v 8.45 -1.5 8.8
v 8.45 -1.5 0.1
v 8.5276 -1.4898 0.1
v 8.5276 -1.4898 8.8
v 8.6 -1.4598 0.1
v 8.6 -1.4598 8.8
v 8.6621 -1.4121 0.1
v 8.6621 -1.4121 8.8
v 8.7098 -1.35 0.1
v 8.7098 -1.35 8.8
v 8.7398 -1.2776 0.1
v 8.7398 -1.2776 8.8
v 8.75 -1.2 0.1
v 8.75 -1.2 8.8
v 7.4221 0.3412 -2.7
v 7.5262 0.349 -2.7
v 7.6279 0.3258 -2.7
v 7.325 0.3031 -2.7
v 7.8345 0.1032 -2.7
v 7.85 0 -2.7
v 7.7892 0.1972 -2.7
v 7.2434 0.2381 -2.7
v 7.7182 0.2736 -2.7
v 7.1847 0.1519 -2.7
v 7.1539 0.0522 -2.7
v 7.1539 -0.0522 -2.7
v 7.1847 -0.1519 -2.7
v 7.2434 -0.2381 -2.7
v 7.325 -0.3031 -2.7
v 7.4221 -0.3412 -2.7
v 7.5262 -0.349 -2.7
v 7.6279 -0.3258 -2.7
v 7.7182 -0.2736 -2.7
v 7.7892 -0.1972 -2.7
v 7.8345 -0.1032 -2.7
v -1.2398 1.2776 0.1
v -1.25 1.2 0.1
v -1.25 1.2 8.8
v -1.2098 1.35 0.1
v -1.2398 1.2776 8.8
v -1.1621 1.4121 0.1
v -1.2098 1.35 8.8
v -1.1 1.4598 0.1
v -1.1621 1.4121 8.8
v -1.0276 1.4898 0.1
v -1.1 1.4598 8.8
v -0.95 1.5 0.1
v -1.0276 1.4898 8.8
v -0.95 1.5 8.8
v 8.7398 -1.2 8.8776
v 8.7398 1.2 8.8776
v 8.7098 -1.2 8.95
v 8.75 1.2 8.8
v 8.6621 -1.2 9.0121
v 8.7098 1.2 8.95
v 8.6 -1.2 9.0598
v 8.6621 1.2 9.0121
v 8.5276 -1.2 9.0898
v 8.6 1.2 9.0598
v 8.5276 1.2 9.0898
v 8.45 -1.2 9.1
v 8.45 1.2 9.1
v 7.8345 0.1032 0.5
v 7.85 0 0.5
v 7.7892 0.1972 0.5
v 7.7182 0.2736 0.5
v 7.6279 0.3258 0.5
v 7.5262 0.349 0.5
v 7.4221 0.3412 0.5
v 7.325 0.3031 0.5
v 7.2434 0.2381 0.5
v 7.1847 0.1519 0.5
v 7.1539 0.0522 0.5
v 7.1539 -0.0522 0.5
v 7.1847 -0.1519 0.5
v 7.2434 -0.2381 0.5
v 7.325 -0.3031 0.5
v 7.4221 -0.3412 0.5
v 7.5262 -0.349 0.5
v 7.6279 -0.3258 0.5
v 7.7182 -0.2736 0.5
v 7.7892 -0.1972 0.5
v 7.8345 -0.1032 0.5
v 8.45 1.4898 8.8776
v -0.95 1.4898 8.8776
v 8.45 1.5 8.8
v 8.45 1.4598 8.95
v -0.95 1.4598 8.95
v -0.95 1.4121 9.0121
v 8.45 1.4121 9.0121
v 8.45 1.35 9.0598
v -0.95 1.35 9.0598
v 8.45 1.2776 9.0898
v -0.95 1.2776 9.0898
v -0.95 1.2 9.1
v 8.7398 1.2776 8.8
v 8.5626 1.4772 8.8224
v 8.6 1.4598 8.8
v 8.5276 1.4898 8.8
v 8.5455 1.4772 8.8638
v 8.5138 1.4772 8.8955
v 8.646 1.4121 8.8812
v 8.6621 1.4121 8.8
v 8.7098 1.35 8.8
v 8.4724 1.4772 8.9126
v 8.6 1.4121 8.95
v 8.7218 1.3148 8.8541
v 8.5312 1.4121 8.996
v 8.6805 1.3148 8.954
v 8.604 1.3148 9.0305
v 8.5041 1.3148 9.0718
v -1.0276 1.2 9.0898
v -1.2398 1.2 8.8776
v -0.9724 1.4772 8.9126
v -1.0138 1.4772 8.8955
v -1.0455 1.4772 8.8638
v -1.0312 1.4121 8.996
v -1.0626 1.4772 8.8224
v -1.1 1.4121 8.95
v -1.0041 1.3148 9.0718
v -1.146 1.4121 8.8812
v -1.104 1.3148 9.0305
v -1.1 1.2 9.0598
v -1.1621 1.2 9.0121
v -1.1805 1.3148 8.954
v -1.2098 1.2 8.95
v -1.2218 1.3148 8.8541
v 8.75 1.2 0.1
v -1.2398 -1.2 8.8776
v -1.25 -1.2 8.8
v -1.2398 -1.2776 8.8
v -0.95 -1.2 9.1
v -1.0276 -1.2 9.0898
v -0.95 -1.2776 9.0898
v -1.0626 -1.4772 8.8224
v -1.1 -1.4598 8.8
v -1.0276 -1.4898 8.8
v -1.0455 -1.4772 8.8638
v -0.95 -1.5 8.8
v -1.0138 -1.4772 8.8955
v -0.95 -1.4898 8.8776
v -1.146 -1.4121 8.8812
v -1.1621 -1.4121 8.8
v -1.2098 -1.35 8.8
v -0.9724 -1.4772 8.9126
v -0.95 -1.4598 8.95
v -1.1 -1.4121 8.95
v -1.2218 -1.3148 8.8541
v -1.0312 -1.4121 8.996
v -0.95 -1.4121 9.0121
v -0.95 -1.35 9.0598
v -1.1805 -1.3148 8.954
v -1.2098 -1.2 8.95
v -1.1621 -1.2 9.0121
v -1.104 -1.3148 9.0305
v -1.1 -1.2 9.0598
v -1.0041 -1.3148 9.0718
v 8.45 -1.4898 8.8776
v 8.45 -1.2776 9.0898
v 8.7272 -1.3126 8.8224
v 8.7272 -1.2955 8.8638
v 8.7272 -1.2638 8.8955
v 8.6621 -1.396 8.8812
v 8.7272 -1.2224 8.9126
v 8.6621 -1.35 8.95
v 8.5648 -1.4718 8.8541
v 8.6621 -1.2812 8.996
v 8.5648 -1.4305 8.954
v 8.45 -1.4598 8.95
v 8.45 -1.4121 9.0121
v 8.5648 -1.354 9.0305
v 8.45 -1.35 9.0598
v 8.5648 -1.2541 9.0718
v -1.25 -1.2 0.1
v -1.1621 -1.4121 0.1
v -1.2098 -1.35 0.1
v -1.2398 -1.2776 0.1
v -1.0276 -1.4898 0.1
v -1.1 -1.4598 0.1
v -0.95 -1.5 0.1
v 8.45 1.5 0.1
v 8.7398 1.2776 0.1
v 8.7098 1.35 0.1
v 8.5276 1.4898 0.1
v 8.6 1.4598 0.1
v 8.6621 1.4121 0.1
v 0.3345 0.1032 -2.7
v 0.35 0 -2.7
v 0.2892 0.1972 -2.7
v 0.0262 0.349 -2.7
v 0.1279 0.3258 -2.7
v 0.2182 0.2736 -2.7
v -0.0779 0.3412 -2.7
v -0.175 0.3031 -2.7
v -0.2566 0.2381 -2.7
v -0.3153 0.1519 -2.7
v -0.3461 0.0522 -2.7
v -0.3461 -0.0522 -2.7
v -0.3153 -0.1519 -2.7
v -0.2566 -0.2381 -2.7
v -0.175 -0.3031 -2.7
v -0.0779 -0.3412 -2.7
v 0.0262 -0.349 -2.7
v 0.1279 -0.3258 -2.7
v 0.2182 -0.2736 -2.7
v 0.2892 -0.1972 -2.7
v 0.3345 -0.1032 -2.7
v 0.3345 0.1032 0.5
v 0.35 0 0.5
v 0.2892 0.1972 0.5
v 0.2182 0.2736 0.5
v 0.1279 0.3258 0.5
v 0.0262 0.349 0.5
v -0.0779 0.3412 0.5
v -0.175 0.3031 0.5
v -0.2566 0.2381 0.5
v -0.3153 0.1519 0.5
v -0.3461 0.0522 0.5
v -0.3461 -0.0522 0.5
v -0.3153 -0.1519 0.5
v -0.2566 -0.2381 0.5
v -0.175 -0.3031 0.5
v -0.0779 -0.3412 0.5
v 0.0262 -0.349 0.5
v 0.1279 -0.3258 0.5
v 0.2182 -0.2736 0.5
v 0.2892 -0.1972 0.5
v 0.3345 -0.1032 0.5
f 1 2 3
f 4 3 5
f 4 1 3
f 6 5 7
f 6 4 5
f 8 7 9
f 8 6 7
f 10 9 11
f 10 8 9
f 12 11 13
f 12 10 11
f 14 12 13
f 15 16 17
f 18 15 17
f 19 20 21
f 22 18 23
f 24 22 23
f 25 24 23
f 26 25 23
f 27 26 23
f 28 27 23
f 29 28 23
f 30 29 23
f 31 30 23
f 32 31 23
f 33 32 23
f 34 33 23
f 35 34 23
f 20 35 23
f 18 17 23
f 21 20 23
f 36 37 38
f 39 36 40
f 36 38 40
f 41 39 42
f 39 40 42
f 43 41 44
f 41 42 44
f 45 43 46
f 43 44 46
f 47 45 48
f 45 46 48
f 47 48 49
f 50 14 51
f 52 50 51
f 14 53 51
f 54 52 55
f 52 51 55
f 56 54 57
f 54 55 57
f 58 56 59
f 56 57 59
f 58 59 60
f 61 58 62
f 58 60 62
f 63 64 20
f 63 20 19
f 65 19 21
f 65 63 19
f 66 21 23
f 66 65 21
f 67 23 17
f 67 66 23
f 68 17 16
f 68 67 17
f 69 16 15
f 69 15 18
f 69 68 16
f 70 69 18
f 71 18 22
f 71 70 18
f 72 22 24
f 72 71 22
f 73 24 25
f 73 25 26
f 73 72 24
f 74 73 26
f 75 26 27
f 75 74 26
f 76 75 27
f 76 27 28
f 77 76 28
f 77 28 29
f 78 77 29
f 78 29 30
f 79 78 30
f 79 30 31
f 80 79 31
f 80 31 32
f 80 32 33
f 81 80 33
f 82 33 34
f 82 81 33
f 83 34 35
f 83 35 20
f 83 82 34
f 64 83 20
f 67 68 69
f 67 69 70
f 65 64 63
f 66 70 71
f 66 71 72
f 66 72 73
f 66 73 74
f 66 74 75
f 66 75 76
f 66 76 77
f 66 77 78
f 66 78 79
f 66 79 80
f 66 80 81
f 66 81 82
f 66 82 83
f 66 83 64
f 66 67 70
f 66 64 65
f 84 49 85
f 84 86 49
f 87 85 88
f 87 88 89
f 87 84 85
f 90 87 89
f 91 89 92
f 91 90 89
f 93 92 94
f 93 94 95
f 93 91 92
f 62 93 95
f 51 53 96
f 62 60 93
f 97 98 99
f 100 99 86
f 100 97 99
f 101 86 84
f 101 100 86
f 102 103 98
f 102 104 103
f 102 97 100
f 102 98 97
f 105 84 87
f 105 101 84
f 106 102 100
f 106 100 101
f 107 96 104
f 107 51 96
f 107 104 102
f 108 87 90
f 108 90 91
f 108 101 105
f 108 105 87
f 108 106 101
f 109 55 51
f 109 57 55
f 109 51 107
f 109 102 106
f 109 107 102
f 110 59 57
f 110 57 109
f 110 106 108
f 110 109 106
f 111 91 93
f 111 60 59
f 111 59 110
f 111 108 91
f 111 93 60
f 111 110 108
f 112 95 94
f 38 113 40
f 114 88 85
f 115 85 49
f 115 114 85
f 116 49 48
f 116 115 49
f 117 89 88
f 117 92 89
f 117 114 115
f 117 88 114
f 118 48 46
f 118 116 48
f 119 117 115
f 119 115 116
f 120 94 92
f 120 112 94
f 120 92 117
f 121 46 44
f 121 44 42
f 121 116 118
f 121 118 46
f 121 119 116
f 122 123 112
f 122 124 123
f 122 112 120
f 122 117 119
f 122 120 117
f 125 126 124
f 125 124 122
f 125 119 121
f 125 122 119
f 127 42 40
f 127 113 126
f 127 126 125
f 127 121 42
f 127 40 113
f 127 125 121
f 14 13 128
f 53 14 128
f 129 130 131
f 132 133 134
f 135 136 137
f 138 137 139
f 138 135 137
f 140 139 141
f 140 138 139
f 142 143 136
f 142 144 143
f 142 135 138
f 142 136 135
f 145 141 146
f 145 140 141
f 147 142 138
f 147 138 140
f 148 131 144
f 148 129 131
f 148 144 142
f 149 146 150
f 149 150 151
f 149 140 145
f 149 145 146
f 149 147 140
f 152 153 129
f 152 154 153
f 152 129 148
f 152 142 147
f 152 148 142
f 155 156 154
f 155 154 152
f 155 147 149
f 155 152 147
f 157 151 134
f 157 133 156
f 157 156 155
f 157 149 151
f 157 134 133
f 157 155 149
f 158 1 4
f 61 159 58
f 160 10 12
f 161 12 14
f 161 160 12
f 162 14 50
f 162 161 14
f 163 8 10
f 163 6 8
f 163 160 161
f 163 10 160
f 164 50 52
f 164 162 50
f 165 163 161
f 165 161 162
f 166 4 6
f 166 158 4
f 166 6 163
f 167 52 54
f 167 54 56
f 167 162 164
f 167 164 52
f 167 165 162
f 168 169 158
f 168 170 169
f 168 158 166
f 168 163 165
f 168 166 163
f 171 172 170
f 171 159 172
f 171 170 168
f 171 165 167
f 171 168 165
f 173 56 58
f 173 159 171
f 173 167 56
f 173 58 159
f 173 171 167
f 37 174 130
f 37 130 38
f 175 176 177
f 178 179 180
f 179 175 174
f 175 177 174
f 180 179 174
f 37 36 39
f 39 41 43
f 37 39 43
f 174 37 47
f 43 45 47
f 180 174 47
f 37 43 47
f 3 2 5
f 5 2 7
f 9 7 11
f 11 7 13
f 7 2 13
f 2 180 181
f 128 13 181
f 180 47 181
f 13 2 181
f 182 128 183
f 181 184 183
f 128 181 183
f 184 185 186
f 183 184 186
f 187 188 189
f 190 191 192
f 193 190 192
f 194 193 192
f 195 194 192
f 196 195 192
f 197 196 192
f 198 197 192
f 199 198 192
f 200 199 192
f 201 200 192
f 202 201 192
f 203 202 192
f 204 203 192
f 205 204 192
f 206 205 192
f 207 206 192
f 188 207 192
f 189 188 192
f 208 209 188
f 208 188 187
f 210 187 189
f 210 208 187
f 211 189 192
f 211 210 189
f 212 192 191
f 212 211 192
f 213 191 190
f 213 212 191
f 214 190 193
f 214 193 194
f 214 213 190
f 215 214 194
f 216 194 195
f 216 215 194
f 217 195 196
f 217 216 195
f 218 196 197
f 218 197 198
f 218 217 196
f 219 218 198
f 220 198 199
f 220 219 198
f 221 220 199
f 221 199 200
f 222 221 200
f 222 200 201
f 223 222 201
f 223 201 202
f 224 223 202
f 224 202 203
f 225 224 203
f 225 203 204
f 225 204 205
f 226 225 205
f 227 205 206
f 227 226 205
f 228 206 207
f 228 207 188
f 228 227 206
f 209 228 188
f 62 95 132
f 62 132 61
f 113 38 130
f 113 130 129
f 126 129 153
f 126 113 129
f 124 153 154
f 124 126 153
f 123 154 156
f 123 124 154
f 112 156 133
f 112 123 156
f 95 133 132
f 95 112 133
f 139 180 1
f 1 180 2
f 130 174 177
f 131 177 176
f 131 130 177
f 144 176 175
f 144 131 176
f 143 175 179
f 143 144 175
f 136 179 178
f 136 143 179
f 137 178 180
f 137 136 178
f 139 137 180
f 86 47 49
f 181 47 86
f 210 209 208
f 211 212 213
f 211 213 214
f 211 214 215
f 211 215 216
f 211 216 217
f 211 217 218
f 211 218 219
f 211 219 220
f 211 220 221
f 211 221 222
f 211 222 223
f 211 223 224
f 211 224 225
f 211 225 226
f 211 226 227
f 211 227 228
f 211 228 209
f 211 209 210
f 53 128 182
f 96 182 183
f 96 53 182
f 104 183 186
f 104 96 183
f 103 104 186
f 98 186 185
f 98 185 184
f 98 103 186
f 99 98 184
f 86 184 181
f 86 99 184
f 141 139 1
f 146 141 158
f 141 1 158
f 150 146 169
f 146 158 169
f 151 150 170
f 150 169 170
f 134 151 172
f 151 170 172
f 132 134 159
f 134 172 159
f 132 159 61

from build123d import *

# Parameters (mm, degrees)
SKETCH_W     = 10
SKETCH_H     = 3
PAD_DEPTH    = 9
FILLET_R     = 0.3
SKETCH001_R  = 0.35
PAD001_DEPTH = 3.2


with BuildPart() as fillet_body:
    # Sketch → Pad (new body)
    with BuildSketch(Plane.XY.offset(0.1)):
        with Locations((3.75, 0)):
            Rectangle(SKETCH_W, SKETCH_H)
    extrude(amount=PAD_DEPTH)

    # Fillet
    fillet_edges = [fillet_body.edges().sort_by_distance(p)[0] for p in [
        (-1.25, 0, 9.1),
        (-1.25, -1.5, 4.6),
        (3.75, -1.5, 9.1),
        (8.75, -1.5, 4.6),
        (8.75, 0, 9.1),
        (8.75, 1.5, 4.6),
        (3.75, 1.5, 9.1),
        (-1.25, 1.5, 4.6),
    ]]
    fillet(fillet_edges, radius=FILLET_R)


with BuildPart() as pad001:
    # Sketch001 → Pad001 (new body)
    with BuildSketch(Plane.XY.offset(0.5)):
        Circle(SKETCH001_R)
        with Locations((7.5, 0)):
            Circle(SKETCH001_R)
    extrude(amount=-PAD001_DEPTH)


solid = Compound([fillet_body.part, pad001.part])
